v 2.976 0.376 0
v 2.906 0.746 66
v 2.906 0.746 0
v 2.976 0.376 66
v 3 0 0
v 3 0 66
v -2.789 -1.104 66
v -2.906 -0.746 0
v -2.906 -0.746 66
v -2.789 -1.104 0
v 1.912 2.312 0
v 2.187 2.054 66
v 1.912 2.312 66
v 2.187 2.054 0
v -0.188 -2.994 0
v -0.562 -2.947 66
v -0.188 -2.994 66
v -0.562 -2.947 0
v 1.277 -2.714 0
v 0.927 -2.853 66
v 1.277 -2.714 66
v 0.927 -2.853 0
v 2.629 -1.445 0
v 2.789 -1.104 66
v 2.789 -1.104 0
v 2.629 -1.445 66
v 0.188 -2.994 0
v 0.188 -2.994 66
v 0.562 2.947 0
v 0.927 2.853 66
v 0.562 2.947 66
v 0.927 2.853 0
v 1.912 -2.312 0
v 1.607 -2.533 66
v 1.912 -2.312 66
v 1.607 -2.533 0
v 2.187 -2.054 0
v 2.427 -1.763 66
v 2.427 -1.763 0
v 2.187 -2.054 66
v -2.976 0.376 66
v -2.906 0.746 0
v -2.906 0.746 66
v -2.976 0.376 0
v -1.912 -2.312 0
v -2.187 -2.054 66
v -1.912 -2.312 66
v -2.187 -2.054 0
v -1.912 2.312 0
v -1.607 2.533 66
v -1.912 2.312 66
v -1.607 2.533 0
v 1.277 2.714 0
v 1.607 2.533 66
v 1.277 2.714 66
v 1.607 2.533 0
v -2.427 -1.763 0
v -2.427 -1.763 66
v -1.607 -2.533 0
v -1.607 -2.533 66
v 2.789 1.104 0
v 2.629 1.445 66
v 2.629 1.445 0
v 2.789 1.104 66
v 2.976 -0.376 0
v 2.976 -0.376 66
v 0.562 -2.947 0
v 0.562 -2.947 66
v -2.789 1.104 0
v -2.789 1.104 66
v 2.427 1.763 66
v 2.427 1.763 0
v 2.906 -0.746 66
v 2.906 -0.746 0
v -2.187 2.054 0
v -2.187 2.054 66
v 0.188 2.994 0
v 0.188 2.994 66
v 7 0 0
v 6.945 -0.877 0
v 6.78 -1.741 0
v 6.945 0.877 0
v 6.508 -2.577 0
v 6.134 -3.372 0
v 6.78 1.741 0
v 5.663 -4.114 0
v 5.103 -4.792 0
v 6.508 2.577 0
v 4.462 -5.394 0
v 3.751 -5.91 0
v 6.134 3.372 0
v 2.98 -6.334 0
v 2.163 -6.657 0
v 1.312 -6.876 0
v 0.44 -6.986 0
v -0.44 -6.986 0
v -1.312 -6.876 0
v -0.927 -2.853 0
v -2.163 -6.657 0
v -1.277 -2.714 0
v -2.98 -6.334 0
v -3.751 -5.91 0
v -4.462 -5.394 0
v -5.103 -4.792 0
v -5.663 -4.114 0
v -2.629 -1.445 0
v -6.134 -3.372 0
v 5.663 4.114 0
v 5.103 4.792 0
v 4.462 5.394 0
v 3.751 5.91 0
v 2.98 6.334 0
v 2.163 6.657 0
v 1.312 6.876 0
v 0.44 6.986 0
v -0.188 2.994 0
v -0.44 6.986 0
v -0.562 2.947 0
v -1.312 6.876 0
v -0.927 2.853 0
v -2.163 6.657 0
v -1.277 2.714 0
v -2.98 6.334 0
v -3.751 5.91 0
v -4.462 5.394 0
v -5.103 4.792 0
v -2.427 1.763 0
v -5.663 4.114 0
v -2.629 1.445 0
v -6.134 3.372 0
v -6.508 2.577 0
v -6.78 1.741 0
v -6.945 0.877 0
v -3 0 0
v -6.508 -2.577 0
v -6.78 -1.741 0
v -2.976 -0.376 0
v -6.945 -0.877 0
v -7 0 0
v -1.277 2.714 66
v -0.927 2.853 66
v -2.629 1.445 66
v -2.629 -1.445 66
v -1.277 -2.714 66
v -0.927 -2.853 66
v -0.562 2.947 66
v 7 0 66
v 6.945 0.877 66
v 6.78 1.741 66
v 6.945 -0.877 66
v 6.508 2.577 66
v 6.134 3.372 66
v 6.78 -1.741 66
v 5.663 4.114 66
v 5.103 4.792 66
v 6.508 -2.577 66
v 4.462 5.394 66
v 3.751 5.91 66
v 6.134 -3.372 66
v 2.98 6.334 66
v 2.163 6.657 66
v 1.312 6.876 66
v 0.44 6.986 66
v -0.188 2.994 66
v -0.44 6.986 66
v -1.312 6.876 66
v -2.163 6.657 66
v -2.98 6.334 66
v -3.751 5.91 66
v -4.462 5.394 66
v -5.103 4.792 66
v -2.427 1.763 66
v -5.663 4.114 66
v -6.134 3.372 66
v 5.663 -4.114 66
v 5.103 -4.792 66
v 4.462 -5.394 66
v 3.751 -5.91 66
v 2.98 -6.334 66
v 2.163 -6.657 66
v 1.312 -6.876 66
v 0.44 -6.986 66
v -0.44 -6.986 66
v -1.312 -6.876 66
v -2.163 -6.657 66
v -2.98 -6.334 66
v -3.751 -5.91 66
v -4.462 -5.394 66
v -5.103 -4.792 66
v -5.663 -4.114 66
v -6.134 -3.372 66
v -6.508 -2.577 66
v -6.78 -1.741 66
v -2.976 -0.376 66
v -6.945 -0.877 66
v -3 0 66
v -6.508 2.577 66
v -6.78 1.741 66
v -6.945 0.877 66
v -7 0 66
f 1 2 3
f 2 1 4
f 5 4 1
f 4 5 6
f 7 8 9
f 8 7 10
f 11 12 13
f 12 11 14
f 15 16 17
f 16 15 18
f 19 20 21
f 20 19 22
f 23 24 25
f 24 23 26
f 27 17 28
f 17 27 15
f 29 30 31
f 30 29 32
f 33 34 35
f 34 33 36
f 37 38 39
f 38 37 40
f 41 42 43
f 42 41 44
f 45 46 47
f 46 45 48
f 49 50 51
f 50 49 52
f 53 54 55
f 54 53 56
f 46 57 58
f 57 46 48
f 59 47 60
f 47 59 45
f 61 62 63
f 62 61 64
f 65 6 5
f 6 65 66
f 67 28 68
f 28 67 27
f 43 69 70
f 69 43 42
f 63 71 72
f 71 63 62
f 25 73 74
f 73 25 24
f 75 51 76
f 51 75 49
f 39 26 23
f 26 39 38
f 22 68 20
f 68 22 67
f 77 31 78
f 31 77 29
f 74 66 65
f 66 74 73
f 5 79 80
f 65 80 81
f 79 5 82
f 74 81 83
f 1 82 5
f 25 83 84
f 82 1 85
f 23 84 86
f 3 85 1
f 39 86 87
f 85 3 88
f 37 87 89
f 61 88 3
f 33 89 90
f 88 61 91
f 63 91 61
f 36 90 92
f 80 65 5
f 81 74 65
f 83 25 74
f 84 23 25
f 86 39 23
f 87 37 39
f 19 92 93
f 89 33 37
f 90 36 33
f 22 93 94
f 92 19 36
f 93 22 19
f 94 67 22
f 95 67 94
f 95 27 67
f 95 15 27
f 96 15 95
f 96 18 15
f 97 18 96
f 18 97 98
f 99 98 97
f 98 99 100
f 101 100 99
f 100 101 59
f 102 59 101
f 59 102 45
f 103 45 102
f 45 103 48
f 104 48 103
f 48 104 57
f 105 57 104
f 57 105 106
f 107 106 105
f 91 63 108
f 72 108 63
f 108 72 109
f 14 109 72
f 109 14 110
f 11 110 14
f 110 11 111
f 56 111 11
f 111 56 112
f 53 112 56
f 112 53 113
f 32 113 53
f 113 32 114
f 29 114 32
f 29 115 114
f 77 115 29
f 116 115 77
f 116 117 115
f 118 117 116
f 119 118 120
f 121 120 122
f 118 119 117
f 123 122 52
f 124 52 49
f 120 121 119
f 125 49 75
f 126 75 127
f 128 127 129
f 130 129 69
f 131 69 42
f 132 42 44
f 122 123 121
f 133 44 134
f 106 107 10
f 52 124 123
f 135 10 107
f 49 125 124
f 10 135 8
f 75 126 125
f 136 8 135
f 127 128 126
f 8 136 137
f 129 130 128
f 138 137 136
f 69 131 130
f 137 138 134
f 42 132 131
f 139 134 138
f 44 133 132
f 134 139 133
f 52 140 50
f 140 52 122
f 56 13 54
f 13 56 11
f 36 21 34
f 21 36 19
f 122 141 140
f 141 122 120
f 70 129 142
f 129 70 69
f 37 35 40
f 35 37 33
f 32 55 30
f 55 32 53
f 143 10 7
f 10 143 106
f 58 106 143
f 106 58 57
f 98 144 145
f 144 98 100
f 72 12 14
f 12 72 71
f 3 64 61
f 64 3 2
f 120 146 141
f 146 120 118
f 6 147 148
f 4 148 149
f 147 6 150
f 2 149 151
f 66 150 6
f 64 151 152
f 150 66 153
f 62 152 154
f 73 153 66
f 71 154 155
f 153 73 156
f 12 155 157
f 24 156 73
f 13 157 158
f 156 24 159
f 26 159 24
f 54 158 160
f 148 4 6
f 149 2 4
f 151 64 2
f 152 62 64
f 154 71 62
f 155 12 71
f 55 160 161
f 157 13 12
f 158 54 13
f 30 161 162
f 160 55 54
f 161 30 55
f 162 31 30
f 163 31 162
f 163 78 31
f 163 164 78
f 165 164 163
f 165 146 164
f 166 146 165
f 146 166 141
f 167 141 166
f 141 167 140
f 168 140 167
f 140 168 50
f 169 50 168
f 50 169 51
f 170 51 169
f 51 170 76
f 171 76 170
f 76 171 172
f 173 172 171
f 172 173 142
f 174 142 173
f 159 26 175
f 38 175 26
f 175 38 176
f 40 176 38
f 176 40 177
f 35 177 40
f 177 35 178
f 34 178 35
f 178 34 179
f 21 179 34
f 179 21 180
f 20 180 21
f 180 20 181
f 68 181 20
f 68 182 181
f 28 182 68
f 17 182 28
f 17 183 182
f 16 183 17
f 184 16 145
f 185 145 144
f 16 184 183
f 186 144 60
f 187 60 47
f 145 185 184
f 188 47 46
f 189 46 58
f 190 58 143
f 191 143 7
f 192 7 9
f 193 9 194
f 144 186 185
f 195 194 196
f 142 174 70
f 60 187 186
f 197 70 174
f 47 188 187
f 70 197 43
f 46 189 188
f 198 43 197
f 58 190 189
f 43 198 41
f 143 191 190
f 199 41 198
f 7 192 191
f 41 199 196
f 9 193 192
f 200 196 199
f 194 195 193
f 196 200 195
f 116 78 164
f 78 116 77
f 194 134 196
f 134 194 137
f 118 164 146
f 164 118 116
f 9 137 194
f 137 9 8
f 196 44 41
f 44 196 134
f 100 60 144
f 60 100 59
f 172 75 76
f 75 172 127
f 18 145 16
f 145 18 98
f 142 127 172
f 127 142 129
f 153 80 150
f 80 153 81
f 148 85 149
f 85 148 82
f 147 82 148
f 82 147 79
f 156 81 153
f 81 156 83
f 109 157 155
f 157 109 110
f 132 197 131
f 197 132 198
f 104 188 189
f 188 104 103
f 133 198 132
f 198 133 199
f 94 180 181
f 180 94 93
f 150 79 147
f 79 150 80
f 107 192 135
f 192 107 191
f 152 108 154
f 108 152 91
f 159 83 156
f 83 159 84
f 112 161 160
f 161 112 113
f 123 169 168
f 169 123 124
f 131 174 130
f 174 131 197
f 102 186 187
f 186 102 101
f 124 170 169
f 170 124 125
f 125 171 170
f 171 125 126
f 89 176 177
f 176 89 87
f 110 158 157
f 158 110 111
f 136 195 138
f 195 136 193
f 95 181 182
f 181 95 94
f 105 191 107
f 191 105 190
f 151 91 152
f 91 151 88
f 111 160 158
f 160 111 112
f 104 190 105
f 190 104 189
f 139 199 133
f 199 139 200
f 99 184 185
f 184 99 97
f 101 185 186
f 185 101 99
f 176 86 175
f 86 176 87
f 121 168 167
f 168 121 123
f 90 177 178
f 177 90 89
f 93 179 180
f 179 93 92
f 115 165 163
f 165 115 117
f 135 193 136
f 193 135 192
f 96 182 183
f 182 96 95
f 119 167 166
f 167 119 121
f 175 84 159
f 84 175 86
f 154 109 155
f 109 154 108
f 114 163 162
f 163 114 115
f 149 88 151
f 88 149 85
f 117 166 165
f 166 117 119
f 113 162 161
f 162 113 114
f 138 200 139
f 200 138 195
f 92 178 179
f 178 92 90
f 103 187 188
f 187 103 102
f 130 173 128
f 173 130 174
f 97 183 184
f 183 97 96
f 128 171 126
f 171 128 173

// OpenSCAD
$fn = 50;


difference() {
	union() {
		cylinder(h = 66, r = 7.0000000000);
	}
	union() {
		cylinder(h = 66, r = 3.0000000000);
		cylinder(h = 66, r = 3.0000000000);
		cylinder(h = 66, r = 1.5000000000);
		cylinder(h = 66, r = 1.5000000000);
		cylinder(h = 66, r = 1.5000000000);
		cylinder(h = 66, r = 1.5000000000);
		cylinder(h = 66, r = 1.5000000000);
		cylinder(h = 66, r = 1.5000000000);
	}
}
